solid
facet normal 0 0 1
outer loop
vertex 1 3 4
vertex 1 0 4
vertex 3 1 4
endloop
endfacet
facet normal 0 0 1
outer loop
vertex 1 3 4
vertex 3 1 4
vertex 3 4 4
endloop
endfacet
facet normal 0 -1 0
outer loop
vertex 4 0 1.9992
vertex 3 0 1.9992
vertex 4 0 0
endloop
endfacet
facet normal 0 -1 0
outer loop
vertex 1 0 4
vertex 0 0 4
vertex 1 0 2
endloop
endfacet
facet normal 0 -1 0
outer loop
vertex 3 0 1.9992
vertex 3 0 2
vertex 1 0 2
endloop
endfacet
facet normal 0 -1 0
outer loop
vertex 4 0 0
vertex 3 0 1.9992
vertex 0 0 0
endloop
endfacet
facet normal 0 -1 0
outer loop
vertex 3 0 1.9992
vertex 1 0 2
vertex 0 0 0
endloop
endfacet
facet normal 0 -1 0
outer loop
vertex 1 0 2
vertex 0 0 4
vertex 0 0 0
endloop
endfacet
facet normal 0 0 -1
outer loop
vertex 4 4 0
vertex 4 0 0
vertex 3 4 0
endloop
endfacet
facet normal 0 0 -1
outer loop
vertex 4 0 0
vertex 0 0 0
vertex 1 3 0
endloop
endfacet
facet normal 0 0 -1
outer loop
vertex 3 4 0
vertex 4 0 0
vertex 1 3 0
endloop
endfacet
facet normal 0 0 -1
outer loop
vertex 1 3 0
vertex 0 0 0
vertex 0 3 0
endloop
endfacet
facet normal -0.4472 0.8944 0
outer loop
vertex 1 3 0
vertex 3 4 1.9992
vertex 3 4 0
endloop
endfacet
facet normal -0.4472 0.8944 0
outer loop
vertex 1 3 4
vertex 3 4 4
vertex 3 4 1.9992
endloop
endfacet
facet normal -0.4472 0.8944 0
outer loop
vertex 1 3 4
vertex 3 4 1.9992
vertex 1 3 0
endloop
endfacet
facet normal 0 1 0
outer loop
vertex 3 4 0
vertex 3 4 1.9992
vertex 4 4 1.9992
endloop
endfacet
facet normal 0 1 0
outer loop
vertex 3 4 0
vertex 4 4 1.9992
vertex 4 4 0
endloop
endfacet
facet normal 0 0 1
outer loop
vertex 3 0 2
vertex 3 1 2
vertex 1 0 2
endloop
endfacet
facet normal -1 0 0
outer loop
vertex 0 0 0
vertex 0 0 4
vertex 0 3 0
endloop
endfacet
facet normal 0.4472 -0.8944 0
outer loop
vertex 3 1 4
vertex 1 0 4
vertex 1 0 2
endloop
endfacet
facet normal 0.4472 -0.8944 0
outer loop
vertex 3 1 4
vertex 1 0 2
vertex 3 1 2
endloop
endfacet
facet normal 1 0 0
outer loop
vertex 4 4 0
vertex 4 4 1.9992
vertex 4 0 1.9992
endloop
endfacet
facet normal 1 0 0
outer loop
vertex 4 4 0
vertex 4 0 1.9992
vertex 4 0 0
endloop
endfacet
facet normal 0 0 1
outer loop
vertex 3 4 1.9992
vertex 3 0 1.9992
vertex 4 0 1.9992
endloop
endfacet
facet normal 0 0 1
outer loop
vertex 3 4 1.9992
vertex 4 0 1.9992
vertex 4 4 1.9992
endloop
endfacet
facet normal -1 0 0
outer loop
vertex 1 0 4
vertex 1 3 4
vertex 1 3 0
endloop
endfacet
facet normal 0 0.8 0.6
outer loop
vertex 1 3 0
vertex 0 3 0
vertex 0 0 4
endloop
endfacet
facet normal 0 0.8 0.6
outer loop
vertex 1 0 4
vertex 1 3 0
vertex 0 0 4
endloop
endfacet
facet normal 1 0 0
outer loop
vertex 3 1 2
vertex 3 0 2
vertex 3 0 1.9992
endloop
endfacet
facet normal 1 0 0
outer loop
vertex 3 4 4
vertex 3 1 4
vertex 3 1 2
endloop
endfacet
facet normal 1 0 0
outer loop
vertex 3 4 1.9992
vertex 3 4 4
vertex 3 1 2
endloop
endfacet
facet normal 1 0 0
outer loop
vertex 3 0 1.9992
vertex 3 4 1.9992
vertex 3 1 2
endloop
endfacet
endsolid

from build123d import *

# Parameters (mm, degrees)
BOSS_EXTRUDE1_DEPTH = 1
SKETCH3_W           = 4
SKETCH3_H           = 4
BOSS_EXTRUDE2_DEPTH = 2
CUT_EXTRUDE1_DEPTH  = 2
CUT_EXTRUDE2_DEPTH  = 2
SKETCH7_W           = 1.99922299
SKETCH7_H           = 4
BOSS_EXTRUDE3_DEPTH = 1


with BuildPart() as part:
    # Sketch2 → Boss-Extrude1 (new body)
    with BuildSketch(Plane(origin=(0, 0, 0), x_dir=(0, 0, -1), z_dir=(1, 0, 0))):
        Polygon((0, 0), (0, 3), (-4, 0), align=None)
    extrude(amount=BOSS_EXTRUDE1_DEPTH)

    # Sketch3 → Boss-Extrude2 (add)
    with BuildSketch(Plane(origin=(1, 0, 0), x_dir=(0, 0, -1), z_dir=(1, 0, 0))):
        with Locations((-2, 2)):
            Rectangle(SKETCH3_W, SKETCH3_H)
    extrude(amount=BOSS_EXTRUDE2_DEPTH)

    # Sketch5 → Cut-Extrude1 (cut)
    with BuildSketch(Plane.XY.offset(4)):
        Polygon((3, 4), (1, 3), (1, 4), align=None)
        Polygon((1, 0), (3, 1), (3, 0), align=None)
    extrude(amount=-CUT_EXTRUDE1_DEPTH, mode=Mode.SUBTRACT)

    # Sketch6 → Cut-Extrude2 (cut)
    with BuildSketch(Plane.XY.offset(2)):
        Polygon((3, 4), (1, 4), (1, 3), align=None)
    extrude(amount=-CUT_EXTRUDE2_DEPTH, mode=Mode.SUBTRACT)

    # Sketch7 → Boss-Extrude3 (add)
    with BuildSketch(Plane(origin=(3, 0, 0), x_dir=(0, 0, -1), z_dir=(1, 0, 0))):
        with Locations((-0.999611495, 2)):
            Rectangle(SKETCH7_W, SKETCH7_H)
    extrude(amount=BOSS_EXTRUDE3_DEPTH)


solid = part.part
